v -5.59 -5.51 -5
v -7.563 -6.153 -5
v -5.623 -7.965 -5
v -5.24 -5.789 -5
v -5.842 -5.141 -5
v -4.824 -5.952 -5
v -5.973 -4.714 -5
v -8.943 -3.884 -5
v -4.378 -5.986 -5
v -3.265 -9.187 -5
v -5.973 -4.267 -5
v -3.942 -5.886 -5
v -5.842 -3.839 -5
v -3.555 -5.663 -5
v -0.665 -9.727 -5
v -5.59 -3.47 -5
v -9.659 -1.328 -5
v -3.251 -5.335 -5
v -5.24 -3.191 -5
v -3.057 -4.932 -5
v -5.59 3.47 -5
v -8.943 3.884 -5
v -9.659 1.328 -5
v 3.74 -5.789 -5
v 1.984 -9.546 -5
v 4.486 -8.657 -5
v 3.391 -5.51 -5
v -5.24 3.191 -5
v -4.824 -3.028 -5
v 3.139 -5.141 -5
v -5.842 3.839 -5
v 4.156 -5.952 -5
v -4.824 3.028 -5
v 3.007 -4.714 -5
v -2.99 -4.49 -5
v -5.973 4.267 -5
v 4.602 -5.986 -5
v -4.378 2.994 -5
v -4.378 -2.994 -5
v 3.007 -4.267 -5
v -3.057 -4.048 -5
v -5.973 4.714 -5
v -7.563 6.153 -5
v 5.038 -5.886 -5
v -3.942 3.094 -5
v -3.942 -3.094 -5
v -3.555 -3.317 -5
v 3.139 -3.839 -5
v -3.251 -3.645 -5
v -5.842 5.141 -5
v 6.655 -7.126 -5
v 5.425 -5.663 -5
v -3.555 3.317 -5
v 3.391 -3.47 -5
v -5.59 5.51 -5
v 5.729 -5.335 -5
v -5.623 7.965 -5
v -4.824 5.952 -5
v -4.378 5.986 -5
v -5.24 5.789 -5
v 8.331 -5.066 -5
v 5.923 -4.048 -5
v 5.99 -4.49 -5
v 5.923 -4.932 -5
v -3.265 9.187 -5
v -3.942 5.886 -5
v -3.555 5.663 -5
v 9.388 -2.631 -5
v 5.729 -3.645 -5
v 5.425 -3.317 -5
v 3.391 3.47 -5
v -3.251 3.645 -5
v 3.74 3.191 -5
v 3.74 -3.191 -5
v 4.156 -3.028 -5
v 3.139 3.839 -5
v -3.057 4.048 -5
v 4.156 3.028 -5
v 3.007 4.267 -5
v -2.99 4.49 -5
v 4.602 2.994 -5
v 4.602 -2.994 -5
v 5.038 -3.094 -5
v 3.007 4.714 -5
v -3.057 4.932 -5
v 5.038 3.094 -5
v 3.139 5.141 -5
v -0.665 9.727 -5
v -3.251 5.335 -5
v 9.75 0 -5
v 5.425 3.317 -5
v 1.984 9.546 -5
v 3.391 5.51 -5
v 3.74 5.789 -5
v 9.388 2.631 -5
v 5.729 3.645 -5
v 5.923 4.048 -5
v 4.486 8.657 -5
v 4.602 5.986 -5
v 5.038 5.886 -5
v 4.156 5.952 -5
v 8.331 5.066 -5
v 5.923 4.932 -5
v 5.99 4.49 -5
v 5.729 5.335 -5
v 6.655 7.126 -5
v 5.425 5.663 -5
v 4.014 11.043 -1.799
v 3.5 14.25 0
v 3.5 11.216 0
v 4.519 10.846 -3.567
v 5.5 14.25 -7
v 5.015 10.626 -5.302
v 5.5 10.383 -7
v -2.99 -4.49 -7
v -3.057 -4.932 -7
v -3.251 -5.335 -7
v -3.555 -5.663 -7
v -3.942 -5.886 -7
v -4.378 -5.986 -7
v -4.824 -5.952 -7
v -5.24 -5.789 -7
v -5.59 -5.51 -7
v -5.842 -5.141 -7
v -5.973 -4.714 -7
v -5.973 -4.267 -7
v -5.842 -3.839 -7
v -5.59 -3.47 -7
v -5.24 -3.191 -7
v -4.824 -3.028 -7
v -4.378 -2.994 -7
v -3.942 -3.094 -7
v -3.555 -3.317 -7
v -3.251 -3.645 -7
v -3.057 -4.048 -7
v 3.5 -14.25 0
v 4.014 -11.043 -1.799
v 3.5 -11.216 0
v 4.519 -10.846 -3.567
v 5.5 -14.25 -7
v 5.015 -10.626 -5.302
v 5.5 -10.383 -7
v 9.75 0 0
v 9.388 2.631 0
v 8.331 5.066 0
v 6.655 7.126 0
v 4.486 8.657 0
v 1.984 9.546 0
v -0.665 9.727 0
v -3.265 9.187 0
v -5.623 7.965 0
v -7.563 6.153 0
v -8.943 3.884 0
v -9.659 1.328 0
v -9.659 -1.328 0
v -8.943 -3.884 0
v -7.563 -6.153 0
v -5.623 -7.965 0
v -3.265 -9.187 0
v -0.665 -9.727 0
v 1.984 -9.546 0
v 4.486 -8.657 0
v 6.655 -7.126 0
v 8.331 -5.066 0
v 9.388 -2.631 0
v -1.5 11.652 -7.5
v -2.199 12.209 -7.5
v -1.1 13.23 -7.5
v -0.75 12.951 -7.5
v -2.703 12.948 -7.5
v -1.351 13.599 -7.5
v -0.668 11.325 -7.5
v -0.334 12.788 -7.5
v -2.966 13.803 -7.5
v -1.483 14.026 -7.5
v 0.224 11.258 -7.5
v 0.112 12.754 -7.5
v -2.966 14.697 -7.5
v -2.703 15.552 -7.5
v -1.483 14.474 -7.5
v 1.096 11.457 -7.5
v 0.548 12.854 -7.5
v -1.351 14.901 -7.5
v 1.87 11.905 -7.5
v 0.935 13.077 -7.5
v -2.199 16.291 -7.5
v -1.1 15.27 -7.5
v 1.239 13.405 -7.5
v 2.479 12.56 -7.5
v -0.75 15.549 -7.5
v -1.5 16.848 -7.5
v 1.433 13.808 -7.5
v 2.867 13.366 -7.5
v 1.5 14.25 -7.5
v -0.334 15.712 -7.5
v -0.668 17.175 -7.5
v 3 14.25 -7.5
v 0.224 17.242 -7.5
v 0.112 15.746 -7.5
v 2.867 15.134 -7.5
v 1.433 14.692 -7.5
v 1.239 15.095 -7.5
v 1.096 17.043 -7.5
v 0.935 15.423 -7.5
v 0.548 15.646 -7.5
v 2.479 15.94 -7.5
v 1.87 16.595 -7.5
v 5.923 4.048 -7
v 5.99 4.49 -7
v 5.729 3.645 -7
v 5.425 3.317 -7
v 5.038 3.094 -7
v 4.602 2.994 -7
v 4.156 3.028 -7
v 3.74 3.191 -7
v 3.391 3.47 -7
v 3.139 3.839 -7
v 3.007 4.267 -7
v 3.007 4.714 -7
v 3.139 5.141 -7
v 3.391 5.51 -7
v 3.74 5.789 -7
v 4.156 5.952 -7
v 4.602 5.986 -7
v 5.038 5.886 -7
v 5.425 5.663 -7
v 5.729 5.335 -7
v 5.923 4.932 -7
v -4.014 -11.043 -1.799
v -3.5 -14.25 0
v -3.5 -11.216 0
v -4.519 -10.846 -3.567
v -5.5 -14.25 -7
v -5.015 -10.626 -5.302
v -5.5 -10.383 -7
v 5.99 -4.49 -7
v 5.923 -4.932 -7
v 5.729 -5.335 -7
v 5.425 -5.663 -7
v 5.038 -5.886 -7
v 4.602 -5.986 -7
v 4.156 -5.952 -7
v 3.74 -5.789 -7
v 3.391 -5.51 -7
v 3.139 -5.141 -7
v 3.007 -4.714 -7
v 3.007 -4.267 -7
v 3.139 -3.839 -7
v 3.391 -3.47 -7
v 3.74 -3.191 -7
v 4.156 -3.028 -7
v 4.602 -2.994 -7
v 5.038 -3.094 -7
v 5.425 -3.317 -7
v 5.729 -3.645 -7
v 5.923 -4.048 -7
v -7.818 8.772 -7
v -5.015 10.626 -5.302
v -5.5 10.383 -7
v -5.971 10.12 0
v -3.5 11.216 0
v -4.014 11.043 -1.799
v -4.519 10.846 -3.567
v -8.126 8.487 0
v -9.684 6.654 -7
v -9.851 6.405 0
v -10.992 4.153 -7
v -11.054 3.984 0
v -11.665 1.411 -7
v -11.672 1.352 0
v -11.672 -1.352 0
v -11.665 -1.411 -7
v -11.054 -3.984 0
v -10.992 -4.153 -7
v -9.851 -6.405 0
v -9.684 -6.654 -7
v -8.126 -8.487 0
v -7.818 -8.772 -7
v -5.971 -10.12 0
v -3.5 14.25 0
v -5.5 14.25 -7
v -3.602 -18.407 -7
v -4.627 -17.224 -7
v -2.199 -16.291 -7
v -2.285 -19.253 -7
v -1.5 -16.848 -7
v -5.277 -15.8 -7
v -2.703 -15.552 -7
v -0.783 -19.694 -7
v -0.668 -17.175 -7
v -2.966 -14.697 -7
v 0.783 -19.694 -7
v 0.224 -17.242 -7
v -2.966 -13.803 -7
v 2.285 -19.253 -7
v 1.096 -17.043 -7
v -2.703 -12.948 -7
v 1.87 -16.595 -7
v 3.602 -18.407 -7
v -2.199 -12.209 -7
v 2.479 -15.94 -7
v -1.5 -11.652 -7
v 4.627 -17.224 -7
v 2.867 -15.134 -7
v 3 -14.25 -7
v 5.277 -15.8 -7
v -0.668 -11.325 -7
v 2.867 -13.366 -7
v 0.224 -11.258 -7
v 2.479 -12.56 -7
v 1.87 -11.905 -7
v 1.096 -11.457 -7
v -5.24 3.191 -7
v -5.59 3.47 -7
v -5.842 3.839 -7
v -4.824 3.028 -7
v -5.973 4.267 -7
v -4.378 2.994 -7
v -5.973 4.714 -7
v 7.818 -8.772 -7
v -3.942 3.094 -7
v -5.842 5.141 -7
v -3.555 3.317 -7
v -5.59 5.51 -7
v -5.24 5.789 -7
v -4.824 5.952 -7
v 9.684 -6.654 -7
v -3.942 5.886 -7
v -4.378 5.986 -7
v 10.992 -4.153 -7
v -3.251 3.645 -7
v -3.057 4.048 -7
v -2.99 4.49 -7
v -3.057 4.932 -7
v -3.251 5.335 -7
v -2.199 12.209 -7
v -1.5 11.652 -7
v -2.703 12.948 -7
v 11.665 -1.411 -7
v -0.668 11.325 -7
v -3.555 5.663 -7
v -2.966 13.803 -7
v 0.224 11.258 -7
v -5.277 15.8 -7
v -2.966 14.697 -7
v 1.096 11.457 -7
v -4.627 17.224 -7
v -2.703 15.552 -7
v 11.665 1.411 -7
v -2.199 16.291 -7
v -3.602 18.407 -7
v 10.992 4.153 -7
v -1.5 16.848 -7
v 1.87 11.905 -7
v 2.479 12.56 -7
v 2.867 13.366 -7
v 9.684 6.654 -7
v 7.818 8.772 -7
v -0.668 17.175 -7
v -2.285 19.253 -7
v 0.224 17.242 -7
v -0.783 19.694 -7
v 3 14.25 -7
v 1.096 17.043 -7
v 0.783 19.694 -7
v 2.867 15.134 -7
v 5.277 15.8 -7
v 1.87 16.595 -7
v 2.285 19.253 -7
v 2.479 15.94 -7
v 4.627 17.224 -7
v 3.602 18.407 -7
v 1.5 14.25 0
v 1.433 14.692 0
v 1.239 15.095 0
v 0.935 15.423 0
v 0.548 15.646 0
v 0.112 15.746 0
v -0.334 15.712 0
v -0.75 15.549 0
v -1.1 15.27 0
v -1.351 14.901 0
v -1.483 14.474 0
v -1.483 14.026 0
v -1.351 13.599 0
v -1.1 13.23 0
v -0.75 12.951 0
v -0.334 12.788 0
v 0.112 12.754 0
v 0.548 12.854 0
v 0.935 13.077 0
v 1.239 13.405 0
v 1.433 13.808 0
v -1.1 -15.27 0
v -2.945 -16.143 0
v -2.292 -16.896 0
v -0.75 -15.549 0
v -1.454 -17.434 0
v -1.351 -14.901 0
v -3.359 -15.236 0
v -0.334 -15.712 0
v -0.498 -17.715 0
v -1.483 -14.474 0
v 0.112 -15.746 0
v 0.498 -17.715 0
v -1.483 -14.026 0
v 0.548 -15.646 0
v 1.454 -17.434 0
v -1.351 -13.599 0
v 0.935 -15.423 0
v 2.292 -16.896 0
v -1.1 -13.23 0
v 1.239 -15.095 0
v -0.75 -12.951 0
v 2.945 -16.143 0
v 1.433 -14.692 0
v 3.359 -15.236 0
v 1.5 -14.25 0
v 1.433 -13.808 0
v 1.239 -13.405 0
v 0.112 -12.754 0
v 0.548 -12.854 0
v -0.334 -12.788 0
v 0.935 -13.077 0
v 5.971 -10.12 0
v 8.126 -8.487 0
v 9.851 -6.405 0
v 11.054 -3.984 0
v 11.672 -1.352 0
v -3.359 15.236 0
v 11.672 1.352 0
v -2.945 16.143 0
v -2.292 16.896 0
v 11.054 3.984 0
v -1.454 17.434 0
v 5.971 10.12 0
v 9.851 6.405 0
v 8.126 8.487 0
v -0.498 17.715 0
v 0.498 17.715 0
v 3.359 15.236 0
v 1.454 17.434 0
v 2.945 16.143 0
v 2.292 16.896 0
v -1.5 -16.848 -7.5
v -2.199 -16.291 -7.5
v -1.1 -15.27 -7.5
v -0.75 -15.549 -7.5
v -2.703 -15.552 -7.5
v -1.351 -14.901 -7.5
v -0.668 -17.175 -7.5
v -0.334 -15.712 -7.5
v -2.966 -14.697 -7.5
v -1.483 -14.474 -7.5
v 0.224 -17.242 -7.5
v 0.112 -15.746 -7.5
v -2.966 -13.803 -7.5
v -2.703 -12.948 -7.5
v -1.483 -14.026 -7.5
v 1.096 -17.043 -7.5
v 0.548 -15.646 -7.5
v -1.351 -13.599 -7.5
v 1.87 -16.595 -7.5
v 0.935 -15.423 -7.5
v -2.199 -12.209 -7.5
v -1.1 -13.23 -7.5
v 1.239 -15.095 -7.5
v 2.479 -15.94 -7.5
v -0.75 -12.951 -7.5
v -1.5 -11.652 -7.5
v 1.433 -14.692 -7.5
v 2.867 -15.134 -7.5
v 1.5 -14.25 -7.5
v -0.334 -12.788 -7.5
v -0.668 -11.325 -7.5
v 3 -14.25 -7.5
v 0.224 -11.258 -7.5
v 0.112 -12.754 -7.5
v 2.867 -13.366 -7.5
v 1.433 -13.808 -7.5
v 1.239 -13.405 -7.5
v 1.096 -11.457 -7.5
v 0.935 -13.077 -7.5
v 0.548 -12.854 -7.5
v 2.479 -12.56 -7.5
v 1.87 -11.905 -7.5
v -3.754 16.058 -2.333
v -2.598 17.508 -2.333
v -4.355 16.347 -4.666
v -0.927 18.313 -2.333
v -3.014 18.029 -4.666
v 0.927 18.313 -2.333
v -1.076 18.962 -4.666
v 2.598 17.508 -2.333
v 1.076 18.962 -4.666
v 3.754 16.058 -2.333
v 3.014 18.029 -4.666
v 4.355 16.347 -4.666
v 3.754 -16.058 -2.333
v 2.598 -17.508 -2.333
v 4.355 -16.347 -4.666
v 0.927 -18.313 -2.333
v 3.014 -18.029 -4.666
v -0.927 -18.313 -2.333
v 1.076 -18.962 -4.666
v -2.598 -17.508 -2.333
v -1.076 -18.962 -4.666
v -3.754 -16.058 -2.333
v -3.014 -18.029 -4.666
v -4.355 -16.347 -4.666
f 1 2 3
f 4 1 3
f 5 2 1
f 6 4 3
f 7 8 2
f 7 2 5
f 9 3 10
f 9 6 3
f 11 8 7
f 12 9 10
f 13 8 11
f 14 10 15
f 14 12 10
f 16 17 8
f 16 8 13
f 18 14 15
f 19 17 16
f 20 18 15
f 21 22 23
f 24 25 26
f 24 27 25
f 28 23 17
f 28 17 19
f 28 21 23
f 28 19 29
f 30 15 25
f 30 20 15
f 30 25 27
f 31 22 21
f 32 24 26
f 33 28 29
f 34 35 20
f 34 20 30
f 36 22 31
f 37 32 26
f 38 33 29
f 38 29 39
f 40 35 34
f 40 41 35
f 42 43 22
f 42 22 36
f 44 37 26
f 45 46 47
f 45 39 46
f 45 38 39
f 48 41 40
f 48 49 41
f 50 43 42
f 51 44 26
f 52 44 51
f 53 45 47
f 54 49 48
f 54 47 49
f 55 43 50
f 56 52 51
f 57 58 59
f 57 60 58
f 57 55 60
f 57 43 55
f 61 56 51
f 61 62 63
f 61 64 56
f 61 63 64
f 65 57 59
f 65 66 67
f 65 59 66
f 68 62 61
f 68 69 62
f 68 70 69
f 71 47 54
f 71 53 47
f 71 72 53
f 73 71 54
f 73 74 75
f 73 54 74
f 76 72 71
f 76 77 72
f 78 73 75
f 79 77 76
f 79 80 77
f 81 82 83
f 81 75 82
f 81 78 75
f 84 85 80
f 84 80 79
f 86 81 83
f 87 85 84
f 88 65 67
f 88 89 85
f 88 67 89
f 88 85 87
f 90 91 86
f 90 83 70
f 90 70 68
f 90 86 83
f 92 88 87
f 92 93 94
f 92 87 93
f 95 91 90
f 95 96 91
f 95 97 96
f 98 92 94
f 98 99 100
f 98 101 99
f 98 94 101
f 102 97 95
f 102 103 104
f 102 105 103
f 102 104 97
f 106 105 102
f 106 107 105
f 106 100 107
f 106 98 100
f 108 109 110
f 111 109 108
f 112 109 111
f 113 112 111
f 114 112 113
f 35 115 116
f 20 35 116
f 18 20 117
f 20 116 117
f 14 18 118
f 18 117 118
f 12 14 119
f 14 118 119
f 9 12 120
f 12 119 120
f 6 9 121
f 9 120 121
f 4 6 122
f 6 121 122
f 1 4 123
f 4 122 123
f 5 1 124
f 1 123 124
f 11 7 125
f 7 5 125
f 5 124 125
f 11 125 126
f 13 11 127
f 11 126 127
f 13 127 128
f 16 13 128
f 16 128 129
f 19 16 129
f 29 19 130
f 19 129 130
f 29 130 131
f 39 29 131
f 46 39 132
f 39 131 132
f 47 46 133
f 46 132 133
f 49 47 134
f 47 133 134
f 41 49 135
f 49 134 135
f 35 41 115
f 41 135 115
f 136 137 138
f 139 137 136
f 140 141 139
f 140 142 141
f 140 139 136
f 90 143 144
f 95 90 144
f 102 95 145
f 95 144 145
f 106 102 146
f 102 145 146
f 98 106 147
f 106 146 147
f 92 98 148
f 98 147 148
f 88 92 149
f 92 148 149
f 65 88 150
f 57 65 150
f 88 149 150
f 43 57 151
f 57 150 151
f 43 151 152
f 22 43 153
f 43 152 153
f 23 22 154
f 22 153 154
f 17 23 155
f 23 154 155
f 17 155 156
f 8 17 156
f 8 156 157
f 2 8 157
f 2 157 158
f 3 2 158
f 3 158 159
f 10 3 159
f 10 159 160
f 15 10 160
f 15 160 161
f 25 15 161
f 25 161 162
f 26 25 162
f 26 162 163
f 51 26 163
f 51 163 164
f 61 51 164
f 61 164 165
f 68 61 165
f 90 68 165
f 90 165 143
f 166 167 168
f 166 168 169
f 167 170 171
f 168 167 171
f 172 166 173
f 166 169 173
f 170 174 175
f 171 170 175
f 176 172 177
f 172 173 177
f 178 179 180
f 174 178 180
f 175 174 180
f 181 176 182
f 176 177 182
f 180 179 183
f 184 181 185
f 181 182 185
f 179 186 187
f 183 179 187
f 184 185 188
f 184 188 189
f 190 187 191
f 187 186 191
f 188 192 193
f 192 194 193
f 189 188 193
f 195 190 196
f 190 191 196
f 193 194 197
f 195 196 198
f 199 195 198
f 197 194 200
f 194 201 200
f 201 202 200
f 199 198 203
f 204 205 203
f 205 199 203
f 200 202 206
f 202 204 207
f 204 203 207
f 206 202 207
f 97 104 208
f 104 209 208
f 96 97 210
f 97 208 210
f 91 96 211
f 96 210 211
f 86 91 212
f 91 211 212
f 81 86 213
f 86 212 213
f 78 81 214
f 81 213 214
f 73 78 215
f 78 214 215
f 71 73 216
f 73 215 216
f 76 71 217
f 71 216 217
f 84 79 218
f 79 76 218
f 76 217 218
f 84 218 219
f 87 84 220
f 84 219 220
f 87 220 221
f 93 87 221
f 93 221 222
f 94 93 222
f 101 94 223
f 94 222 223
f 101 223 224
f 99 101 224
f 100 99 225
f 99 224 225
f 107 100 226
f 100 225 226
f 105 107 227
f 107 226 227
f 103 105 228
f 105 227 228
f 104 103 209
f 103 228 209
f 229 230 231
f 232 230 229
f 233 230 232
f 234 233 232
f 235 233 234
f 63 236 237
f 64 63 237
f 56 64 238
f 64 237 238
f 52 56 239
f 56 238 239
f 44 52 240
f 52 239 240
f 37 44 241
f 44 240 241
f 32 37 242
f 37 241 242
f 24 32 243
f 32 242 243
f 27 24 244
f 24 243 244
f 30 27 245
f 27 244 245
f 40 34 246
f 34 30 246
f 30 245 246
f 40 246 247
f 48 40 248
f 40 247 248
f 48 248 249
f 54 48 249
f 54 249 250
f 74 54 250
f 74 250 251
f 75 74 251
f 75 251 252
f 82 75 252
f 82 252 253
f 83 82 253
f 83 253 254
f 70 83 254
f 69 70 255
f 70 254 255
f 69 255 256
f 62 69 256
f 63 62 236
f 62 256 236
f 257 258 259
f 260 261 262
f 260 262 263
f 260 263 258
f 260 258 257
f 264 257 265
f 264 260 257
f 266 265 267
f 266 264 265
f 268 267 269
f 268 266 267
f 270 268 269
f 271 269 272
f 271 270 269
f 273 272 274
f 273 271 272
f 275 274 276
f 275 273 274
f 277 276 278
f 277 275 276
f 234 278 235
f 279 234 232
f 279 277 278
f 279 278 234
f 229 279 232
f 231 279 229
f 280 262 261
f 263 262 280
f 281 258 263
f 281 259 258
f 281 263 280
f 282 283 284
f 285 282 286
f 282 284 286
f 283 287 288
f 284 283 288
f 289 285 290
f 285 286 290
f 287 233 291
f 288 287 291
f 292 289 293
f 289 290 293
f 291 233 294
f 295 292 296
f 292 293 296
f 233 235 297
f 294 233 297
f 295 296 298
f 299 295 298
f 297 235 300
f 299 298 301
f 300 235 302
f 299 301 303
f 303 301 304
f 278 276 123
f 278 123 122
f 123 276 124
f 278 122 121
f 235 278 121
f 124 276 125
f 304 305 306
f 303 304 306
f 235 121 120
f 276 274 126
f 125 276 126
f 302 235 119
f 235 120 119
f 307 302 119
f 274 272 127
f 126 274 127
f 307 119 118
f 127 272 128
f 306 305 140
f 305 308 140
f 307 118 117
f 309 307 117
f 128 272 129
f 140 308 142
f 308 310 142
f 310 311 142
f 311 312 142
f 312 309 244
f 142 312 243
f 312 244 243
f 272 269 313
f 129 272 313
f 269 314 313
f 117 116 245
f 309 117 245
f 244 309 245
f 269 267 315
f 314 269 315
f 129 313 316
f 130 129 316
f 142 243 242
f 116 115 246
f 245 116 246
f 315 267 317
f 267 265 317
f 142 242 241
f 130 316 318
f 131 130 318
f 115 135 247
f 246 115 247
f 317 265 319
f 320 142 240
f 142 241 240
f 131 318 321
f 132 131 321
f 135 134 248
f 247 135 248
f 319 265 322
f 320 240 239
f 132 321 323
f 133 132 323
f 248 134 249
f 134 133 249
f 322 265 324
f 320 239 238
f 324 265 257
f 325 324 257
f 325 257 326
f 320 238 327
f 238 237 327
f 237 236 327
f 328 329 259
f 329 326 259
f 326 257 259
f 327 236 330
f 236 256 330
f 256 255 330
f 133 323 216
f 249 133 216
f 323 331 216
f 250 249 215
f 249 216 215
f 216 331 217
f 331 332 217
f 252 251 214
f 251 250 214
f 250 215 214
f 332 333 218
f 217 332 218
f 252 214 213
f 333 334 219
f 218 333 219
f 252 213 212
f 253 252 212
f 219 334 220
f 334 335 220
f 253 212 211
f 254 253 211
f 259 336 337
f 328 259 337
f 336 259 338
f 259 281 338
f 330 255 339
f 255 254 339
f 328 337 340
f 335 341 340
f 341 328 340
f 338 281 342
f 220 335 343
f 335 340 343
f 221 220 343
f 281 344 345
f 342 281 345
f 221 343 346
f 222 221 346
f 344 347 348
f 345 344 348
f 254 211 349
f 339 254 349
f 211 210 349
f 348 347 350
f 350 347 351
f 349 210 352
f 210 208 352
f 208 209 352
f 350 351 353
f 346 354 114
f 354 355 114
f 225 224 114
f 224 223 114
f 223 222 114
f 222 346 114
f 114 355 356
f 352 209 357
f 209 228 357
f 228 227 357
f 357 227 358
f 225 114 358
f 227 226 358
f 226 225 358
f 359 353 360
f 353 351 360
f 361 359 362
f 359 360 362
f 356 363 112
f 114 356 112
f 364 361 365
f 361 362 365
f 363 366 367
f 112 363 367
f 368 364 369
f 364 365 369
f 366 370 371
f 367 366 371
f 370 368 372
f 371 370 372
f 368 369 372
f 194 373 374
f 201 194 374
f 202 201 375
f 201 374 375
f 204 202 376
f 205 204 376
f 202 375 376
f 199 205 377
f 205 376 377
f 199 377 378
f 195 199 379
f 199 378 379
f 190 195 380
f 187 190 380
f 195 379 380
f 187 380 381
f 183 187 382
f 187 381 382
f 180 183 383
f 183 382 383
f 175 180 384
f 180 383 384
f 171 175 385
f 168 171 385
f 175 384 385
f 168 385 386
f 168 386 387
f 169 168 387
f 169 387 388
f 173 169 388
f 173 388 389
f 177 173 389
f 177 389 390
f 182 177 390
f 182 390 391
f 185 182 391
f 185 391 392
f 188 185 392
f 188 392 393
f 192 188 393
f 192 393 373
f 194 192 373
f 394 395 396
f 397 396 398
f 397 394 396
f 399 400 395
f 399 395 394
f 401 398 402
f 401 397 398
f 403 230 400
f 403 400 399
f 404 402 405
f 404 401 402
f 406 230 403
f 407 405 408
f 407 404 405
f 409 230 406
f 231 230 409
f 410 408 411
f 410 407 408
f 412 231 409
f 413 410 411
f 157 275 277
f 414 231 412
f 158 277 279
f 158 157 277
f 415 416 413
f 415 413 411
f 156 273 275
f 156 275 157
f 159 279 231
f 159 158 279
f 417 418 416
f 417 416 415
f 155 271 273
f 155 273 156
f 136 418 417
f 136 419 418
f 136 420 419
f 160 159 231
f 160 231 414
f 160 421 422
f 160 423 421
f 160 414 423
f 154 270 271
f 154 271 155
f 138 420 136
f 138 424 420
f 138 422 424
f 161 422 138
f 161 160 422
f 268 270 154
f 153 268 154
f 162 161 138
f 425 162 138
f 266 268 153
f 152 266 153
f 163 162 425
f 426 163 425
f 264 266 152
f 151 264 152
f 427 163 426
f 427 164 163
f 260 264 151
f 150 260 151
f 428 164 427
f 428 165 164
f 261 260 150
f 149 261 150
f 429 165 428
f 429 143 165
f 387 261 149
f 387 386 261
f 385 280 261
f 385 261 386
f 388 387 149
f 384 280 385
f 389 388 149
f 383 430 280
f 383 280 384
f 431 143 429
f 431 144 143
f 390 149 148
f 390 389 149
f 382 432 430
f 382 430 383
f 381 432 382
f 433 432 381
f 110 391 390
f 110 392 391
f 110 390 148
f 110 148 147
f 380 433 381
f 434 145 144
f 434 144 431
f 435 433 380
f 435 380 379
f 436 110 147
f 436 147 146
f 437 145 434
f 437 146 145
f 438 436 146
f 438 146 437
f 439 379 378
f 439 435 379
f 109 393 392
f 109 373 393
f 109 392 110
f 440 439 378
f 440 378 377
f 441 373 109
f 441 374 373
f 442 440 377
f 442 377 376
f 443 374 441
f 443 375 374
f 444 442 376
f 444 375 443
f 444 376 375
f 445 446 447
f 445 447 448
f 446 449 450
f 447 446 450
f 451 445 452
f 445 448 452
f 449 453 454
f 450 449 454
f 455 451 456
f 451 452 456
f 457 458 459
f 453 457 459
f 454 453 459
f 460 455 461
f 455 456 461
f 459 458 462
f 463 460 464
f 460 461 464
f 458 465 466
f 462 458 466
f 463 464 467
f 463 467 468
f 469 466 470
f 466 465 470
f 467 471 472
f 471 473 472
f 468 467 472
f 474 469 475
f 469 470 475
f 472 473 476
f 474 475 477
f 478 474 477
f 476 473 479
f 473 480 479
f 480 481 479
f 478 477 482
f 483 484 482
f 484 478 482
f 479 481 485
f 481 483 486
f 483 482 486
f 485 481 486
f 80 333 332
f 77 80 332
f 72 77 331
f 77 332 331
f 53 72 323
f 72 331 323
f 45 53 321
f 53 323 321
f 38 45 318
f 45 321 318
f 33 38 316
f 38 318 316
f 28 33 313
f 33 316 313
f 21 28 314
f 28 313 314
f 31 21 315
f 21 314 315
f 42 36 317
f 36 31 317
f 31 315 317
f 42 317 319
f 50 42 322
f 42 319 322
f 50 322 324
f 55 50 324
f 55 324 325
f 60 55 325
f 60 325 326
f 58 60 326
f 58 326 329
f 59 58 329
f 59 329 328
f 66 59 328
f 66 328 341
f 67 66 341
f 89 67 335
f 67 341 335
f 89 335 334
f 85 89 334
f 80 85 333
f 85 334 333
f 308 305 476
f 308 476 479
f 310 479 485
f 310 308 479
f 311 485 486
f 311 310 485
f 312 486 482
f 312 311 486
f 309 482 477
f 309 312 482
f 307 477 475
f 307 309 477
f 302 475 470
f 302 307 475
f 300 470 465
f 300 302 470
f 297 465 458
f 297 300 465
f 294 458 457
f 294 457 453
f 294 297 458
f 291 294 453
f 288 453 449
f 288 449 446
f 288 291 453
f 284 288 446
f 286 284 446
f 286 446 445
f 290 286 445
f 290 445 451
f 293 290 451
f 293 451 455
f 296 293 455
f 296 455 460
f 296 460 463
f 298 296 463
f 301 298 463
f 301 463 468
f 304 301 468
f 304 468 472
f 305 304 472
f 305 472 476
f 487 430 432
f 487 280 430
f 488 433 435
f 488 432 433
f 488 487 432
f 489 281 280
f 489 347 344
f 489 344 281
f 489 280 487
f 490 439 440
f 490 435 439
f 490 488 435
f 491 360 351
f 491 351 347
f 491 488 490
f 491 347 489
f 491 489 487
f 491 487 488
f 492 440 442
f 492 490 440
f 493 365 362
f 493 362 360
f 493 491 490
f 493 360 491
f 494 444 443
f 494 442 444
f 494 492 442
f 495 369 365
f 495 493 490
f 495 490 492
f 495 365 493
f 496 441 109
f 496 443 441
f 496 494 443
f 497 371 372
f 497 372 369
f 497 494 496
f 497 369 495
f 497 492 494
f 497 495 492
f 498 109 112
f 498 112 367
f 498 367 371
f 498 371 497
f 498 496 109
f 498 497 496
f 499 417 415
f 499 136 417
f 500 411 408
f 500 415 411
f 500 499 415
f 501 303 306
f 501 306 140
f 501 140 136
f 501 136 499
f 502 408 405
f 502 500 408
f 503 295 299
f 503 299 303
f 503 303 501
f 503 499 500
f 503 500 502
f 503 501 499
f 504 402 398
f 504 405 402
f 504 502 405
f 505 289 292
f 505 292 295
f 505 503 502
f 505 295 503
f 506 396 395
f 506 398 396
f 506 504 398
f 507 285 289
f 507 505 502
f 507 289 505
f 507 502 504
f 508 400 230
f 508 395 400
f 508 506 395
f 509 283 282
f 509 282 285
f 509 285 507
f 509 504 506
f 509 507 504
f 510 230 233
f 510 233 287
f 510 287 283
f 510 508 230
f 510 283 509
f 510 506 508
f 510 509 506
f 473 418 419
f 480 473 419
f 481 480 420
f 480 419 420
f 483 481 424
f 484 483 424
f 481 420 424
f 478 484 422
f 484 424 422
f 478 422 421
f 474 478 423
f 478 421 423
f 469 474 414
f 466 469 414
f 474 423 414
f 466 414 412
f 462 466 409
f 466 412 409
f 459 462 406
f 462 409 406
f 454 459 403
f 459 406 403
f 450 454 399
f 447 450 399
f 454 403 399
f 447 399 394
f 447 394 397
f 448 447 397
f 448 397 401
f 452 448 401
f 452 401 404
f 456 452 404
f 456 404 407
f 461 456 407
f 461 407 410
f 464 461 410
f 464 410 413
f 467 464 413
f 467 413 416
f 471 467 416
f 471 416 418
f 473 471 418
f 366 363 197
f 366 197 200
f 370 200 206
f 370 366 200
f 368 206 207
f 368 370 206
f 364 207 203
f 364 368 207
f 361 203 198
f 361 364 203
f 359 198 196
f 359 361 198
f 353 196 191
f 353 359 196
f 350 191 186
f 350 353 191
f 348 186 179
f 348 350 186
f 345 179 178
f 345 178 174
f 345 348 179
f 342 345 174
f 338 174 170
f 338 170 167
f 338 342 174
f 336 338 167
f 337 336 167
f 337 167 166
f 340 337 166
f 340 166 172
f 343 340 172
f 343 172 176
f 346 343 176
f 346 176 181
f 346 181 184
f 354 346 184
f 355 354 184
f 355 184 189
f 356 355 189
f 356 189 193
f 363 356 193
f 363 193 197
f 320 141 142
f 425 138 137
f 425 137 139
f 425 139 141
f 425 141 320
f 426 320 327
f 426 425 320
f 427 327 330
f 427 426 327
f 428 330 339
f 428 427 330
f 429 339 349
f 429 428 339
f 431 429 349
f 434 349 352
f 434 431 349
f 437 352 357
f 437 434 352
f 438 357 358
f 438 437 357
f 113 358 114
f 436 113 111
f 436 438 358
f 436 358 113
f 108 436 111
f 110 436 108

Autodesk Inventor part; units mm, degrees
ref_plane "YZ Plane" through (0, 0, 0) normal (1, 0, 0) x (0, 1, 0)
ref_plane "XZ Plane" through (0, 0, 0) normal (0, 1, 0) x (-1, 0, 0)
ref_plane "XY Plane" through (0, 0, 0) normal (0, 0, 1) x (1, 0, 0)
sketch "Skizze1" plane through (0, 0, 0) normal (0, 0, 1) x (1, 0, 0)
  line L0 (0, -14.25) -> (0, 14.25) construction
  arc A0 (-5.5, -14.25) -> (5.5, -14.25) centre (0, -14.25) ccw
  arc A1 (5.5, 14.25) -> (-5.5, 14.25) centre (0, 14.25) ccw
  line L1 (0, 28.35) -> (0, -28.35) construction
  line L2 (-16.45, 0) -> (16.45, 0) construction
  circle A2 centre (0, 14.25) radius 1.5
  circle A3 centre (0, -14.25) radius 1.5
  circle A4 centre (0, 14.25) radius 6 construction
  circle A5 centre (0, -14.25) radius 6 construction
  line L3 (0, 20.25) -> (0, -20.25) construction
  circle A6 centre (0, 14.25) radius 3
  circle A7 centre (0, -14.25) radius 3
  circle A8 centre (0, 0) radius 9.75
  line L4 (-5.5, 14.25) -> (-5.5, 10.3833)
  line L5 (-5.5, -10.3833) -> (-5.5, -14.25)
  line L6 (5.5, -14.25) -> (5.5, -10.3833)
  line L7 (5.5, 10.3833) -> (5.5, 14.25)
  arc A9 (5.5, -10.3833) -> (5.5, 10.3833) centre (0, 0) ccw
  arc A10 (-5.5, 10.3833) -> (-5.5, -10.3833) centre (0, 0) ccw
  circle A11 centre (0, 0) radius 6.35 construction
  circle A12 centre (-4.4901, 4.4901) radius 1.5
  circle A13 centre (-4.4901, -4.4901) radius 1.5
  circle A14 centre (4.4901, -4.4901) radius 1.5
  circle A15 centre (4.4901, 4.4901) radius 1.5
  line L8 (-4.4901, 4.4901) -> (0, 0) construction
  dimension "d4" = 12
  dimension "d31" = 12.7
  dimension "d1" = 3
  dimension "d2" = 4
  dimension "d5" = 40.5
  dimension "d19" = 1.5
  dimension "d26" = 19.5
  dimension "d28" = 2
  dimension "d32" = 3
  dimension "d35" = 360
  dimension "d37" = 45
extrude "Extrusion1" add sketch "Skizze1" against normal blind 7 contours L5 A10 L4 A1 L7 A9 L6 A0 | A6 | A7
chamfer "Fase2" distance 2 distance2 7 6 edges at (5.5, -12.3166, 0) (0, -19.75, 0) (-5.5, -12.3166, 0) (0, 19.75, 0) (5.5, 12.3166, 0) (-5.5, 12.3166, 0) measured on face at (4.1094, 12.7287, 0)
extrude "Extrusion4" add sketch "Skizze1" against normal blind 0.5 from surface at -7 contours A6 | A7
extrude "Extrusion6" add sketch "Skizze1" along normal blind 2 from surface at -7 contours A8
properties part number "HarmonicDrive-WaveGenerator-Bottom"
